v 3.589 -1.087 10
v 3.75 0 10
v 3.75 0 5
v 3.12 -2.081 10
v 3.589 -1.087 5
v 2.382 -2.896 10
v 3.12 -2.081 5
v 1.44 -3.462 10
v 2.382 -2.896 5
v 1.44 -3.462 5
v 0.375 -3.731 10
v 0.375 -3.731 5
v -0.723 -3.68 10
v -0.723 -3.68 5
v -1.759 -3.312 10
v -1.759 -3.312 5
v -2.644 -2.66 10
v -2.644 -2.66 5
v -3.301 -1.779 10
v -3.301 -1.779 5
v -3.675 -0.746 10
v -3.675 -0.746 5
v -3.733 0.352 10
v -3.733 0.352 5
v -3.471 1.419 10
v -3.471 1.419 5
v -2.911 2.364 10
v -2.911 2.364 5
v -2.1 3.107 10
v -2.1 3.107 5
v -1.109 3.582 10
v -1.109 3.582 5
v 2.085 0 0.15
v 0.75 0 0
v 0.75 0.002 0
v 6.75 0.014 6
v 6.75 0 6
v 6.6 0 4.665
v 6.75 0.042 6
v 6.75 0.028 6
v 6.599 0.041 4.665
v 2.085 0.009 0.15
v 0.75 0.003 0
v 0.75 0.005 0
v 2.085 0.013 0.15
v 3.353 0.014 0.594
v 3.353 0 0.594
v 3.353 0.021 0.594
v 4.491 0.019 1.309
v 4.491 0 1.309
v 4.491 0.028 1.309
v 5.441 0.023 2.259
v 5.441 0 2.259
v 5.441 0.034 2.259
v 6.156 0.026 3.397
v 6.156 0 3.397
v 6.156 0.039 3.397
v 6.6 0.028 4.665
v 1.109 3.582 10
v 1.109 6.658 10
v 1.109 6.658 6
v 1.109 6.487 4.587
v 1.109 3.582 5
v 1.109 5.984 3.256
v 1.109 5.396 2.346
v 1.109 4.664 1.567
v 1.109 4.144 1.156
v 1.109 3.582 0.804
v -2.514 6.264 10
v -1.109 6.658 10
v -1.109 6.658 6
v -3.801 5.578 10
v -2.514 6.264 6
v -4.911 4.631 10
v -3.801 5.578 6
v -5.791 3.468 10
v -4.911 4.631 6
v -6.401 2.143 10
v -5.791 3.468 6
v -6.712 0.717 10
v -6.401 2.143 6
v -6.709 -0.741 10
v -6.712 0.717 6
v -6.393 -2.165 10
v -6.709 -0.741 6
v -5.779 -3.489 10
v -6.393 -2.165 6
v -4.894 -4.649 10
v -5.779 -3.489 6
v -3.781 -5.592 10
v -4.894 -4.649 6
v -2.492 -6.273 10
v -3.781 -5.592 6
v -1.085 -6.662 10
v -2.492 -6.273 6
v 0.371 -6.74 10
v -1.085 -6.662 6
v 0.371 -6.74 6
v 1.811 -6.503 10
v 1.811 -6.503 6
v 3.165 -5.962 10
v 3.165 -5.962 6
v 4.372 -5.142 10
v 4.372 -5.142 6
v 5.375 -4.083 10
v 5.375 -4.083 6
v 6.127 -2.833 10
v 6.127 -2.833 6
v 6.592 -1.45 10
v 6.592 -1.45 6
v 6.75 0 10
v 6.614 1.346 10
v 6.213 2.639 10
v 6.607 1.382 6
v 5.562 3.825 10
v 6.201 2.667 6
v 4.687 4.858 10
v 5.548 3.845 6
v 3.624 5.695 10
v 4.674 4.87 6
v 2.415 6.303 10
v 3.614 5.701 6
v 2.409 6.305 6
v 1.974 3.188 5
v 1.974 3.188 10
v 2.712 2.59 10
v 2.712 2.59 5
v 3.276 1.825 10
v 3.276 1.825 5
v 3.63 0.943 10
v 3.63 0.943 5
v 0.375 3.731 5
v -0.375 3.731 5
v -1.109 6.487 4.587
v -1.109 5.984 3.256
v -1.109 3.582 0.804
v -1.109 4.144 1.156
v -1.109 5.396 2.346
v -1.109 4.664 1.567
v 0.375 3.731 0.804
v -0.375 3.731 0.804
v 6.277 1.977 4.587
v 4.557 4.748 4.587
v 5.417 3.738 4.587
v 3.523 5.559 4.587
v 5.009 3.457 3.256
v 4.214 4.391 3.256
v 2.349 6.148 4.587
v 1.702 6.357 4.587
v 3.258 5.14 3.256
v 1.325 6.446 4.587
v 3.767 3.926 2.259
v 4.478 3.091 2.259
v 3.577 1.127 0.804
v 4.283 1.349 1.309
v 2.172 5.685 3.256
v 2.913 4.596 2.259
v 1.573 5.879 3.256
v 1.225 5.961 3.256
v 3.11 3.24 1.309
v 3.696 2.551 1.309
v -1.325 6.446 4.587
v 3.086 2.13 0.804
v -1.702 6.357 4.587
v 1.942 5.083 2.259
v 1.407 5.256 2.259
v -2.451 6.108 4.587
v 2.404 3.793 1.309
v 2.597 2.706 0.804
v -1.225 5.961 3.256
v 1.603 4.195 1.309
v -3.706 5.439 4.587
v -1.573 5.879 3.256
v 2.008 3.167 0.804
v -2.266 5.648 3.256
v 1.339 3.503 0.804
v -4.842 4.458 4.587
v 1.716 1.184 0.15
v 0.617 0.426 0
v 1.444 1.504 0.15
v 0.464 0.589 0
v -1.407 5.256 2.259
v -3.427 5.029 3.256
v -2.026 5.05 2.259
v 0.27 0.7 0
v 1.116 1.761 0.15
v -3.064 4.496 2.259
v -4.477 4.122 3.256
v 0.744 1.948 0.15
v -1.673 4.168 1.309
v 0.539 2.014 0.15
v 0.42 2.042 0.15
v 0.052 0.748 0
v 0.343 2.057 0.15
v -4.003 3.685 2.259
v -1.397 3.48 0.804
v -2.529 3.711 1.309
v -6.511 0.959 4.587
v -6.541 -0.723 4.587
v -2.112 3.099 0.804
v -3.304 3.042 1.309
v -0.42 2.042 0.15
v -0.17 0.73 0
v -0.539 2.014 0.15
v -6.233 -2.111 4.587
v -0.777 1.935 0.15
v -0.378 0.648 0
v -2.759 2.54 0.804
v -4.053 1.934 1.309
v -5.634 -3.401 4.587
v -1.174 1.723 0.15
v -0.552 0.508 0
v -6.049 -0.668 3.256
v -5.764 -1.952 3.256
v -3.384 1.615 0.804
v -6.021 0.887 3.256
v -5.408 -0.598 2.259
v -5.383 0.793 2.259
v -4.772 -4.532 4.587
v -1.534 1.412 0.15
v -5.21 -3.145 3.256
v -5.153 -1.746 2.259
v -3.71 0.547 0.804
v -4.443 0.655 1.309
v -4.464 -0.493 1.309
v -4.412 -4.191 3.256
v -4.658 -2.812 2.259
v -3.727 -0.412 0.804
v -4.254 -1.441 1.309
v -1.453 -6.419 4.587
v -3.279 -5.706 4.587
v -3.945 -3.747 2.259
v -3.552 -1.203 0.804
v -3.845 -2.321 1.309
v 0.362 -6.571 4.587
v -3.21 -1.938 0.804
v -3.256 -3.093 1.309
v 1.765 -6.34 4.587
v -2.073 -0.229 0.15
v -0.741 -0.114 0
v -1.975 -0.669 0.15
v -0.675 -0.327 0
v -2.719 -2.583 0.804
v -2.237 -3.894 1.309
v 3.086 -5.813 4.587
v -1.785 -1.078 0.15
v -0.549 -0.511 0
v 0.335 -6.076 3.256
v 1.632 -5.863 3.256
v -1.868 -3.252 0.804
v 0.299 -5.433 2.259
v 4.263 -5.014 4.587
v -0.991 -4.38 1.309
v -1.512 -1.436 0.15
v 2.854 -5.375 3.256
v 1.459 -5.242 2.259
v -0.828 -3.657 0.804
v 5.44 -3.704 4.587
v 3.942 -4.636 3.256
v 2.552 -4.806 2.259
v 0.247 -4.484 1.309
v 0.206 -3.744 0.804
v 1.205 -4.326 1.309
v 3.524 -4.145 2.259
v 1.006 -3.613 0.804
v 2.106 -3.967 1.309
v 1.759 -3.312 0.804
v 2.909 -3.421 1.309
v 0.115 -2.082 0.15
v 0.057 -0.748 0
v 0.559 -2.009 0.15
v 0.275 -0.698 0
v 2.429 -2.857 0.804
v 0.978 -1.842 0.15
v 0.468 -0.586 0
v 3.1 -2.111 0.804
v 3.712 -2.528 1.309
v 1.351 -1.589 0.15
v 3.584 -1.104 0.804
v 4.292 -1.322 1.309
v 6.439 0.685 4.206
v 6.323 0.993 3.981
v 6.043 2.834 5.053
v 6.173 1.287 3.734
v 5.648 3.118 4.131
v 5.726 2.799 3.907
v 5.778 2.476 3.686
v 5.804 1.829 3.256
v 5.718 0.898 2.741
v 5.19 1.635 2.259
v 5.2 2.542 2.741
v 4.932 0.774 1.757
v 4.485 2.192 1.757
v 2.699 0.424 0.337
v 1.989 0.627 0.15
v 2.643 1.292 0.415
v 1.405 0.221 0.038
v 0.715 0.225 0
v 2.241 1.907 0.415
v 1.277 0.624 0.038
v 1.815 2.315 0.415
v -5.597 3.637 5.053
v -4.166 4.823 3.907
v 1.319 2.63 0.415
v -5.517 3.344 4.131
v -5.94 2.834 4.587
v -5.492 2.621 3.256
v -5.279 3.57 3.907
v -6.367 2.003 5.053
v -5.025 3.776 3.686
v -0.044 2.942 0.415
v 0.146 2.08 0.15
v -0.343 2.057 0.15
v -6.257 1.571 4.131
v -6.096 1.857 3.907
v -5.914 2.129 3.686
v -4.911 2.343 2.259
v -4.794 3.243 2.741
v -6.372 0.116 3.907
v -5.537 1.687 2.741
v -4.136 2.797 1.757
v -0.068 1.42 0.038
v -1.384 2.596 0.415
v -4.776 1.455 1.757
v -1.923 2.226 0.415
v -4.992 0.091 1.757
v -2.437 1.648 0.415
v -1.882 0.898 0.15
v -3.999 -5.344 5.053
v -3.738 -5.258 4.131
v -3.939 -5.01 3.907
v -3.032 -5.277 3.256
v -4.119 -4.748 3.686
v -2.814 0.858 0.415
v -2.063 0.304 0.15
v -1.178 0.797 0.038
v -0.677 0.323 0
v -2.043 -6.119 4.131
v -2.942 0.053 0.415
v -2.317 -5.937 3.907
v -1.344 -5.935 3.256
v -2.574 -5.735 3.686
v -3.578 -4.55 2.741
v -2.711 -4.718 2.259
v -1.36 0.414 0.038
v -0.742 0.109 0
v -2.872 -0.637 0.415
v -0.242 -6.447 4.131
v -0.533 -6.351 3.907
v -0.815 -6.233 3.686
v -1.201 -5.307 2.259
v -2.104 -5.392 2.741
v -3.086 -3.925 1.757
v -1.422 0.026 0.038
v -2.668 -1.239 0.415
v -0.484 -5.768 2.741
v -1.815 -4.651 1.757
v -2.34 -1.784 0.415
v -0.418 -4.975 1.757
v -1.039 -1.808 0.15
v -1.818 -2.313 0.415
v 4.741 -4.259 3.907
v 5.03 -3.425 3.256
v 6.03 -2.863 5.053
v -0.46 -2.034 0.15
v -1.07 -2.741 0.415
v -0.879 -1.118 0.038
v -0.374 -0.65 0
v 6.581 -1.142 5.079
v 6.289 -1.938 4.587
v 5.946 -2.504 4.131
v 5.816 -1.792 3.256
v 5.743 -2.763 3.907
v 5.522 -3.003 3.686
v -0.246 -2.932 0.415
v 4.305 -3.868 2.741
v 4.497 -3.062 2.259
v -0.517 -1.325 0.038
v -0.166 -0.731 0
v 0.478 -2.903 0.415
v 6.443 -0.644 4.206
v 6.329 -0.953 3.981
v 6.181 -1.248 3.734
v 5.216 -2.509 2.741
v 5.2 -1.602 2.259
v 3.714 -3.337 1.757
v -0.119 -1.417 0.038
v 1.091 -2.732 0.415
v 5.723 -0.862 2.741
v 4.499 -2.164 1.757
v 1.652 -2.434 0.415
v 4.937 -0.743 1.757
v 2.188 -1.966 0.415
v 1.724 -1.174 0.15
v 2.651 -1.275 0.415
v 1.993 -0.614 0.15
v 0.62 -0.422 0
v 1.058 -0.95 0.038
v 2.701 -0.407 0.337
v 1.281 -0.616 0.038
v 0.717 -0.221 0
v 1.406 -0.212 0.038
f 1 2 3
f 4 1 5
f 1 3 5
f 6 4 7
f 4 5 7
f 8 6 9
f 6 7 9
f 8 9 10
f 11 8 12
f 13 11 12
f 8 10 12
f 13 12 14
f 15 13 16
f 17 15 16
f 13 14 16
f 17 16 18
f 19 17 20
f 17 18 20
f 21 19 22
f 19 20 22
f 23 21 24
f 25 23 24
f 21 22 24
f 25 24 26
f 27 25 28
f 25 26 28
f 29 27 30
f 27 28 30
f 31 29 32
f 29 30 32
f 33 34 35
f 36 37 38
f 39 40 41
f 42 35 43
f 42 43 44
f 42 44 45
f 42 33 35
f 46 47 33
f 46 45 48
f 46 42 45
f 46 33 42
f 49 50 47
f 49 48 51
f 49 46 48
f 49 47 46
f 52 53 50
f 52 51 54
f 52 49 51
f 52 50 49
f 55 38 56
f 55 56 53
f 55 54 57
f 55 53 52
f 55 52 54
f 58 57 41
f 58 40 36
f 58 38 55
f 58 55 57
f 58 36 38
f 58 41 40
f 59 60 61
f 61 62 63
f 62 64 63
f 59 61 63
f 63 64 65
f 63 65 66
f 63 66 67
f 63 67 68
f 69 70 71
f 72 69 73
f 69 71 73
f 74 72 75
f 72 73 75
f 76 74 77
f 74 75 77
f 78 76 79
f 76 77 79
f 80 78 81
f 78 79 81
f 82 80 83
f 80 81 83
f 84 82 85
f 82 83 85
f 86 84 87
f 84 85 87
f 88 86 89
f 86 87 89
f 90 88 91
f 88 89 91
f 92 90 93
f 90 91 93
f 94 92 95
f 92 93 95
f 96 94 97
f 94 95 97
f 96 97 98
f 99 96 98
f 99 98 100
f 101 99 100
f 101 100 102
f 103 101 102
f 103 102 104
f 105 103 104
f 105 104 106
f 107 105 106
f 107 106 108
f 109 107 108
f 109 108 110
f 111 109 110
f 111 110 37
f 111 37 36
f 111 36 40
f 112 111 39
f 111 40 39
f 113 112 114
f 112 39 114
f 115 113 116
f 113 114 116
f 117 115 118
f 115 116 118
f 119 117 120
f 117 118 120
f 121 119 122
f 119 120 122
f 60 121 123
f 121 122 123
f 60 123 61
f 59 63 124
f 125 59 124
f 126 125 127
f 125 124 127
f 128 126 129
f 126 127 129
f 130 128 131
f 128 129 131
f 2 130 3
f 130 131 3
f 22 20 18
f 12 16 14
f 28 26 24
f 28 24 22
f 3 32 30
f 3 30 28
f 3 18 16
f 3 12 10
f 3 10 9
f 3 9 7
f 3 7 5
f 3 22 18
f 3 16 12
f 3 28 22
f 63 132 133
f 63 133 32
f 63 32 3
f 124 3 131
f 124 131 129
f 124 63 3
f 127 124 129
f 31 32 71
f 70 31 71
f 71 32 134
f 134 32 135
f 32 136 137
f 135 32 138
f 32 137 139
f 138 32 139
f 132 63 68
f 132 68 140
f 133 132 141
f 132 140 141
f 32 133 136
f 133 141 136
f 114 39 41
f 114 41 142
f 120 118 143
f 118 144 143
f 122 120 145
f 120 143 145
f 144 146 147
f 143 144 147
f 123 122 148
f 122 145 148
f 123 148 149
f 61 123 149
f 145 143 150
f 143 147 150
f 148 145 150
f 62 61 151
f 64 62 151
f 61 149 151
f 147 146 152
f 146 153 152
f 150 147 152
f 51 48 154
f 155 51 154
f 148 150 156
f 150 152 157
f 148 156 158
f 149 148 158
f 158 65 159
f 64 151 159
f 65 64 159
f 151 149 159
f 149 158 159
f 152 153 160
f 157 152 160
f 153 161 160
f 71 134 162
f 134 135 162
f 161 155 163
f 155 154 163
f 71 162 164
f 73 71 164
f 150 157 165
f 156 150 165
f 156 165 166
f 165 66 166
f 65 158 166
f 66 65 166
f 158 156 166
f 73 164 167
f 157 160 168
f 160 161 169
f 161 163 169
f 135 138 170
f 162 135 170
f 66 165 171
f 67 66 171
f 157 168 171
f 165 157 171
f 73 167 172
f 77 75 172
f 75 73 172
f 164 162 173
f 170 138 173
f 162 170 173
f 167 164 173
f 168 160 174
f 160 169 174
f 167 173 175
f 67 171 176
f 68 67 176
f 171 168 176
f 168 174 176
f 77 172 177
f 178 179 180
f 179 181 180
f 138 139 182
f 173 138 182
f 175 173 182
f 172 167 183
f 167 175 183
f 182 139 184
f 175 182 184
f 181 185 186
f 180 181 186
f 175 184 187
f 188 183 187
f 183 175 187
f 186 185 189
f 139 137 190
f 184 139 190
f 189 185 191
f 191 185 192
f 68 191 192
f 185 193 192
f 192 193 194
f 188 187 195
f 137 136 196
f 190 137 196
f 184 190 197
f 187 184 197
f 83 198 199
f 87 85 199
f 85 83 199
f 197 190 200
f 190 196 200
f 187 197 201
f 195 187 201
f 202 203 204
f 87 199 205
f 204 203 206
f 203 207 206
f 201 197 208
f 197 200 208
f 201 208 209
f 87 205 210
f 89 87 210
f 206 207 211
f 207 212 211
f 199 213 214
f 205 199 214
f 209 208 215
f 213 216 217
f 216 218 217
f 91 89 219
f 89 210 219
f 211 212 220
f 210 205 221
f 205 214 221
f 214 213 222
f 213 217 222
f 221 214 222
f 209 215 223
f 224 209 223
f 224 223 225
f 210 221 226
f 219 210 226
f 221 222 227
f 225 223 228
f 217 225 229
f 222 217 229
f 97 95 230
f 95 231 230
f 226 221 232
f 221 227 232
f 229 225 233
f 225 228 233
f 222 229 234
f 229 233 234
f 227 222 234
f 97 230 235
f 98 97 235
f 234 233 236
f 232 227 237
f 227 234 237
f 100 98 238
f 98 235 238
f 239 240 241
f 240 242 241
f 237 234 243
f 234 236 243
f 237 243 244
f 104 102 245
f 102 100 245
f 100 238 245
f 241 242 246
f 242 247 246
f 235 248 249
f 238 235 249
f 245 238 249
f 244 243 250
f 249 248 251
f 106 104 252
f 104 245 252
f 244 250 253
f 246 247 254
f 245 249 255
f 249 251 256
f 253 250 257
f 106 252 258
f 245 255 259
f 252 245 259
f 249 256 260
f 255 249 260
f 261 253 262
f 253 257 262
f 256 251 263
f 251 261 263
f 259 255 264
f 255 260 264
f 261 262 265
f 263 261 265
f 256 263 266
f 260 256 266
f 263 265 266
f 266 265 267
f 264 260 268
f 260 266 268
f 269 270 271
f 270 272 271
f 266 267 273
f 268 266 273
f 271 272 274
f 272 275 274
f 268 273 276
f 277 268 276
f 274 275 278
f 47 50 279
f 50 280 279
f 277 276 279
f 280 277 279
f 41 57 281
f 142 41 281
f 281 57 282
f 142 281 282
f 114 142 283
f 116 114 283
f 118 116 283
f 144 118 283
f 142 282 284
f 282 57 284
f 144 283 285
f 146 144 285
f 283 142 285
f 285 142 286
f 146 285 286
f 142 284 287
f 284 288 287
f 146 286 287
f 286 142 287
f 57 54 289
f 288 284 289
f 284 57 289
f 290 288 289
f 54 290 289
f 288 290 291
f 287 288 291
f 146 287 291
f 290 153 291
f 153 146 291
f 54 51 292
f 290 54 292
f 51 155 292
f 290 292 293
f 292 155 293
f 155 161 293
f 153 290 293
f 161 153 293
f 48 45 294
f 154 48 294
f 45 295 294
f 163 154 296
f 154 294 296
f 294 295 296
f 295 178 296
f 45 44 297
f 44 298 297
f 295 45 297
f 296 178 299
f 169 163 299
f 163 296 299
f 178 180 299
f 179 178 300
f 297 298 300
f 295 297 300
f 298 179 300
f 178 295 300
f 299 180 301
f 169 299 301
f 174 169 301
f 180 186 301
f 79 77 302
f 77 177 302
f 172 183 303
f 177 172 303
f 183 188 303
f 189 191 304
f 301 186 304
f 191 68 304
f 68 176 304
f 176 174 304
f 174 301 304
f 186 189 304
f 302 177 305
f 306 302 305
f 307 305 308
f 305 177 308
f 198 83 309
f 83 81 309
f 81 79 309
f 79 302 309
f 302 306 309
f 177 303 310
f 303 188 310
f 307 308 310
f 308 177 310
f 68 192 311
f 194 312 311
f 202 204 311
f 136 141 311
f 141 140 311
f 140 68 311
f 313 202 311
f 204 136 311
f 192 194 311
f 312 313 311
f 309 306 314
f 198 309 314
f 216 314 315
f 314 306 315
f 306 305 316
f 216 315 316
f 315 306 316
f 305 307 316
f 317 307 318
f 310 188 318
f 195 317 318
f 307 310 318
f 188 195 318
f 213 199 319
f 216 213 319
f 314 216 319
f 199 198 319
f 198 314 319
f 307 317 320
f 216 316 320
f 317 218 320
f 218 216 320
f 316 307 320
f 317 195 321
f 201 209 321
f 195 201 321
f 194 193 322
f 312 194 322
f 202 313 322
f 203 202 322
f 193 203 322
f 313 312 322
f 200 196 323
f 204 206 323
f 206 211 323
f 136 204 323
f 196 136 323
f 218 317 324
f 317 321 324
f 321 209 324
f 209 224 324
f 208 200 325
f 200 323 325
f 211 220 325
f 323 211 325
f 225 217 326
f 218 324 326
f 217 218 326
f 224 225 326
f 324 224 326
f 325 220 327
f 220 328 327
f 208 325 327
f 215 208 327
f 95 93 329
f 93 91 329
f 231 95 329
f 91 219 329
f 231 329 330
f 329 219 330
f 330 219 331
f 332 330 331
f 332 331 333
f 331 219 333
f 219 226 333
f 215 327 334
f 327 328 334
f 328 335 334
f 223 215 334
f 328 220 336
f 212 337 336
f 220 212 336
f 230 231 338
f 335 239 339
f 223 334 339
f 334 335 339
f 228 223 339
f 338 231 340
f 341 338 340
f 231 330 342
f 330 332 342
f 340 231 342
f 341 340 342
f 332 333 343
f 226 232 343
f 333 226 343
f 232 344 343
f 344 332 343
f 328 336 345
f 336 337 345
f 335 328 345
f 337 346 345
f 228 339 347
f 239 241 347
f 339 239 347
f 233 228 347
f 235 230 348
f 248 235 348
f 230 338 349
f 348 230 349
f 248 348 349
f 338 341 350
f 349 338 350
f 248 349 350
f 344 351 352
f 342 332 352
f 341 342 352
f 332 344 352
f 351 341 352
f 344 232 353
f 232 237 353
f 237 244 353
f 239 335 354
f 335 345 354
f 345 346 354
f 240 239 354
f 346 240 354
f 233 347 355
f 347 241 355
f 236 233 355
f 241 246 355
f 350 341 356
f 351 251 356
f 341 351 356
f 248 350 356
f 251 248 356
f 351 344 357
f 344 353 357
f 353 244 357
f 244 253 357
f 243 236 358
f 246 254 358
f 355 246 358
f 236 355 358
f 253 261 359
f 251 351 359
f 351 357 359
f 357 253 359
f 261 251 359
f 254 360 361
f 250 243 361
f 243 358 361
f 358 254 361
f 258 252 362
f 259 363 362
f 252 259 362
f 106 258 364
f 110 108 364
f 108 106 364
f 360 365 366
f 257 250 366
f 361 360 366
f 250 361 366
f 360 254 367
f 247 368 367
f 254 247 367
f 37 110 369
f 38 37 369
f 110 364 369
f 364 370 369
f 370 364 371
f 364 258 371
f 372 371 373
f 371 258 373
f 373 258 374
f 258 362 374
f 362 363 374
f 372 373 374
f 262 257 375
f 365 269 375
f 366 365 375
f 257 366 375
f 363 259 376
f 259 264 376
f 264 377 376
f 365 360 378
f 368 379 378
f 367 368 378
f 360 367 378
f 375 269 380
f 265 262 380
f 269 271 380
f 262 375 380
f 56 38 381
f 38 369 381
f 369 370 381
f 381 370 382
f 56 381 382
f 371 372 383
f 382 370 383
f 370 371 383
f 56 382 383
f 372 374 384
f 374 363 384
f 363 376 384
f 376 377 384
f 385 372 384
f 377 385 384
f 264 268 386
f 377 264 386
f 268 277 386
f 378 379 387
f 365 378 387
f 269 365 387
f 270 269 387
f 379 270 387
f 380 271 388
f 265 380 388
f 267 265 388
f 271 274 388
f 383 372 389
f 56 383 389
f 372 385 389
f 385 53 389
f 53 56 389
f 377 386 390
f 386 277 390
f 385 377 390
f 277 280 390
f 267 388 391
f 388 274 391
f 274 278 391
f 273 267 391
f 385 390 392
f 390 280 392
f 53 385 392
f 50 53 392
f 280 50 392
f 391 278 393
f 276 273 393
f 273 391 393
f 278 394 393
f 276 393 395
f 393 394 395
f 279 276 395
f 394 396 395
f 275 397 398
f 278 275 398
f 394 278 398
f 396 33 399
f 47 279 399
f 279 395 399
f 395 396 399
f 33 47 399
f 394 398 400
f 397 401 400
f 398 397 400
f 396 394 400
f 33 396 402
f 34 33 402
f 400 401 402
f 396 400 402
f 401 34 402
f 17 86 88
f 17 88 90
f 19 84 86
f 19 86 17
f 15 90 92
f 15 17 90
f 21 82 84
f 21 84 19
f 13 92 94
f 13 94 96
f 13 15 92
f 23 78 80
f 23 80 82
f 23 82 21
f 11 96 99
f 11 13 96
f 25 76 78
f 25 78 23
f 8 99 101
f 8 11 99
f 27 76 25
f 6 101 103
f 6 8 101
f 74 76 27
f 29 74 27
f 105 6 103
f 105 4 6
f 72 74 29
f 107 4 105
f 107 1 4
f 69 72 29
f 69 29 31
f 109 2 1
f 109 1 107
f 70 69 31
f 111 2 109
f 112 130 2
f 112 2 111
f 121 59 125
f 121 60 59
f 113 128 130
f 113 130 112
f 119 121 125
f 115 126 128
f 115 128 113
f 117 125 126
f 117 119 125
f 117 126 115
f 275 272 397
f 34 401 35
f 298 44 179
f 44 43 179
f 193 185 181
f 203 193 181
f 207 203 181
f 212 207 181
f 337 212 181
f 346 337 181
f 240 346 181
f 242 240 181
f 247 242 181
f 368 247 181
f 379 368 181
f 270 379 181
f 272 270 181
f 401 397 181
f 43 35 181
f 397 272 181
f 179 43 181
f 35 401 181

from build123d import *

# Parameters (mm, degrees)
F1_DEPTH    = 10
F2_DEPTH    = 5
F3_T2_ANGLE = 359.64
F3_T4_ANGLE = 207.9069363925


# Not quite as in the source:
# - a fillet or chamfer that OpenCascade refuses, or shapes differently, is made with other operations: its cross-section is extruded or revolved along the edge and cut away or added


with BuildPart() as f1:
    # F0 (on Top) → F1 (new body)
    with BuildSketch(Plane.XY):
        with BuildLine():
            ThreePointArc((1.1091883061, 3.5822062059), (3.0184396754, 2.2252015473), (3.75, 0))
            ThreePointArc((3.75, 0), (-2.2252015473, -3.0184396754), (-1.1091883061, 3.5822062059))
            Line((-1.1091883061, 3.5822062059), (-1.1091883061, 6.6582431092))
            ThreePointArc((-1.1091883061, 6.6582431092), (-4.3632258097, -5.1502194646), (6.75, 0))
            ThreePointArc((6.75, 0), (5.1502194646, 4.3632258097), (1.1091883061, 6.6582431092))
            Line((1.1091883061, 6.6582431092), (1.1091883061, 3.5822062059))
        make_face()
    extrude(amount=F1_DEPTH)

    # F0 (on Top) → F2 (join)
    with BuildSketch(Plane.XY):
        with BuildLine():
            ThreePointArc((-1.1091883061, 3.5822062059), (-2.2252015473, -3.0184396754), (3.75, 0))
            ThreePointArc((3.75, 0), (3.0184396754, 2.2252015473), (1.1091883061, 3.5822062059))
            Line((1.1091883061, 3.5822062059), (1.1091883061, 0.75))
            Line((1.1091883061, 0.75), (-1.1091883061, 0.75))
            Line((-1.1091883061, 0.75), (-1.1091883061, 3.5822062059))
        make_face()
        with BuildLine():
            Line((1.1091883061, 0.75), (1.1091883061, 3.5822062059))
            ThreePointArc((1.1091883061, 3.5822062059), (0, 3.75), (-1.1091883061, 3.5822062059))
            Line((-1.1091883061, 3.5822062059), (-1.1091883061, 0.75))
            Line((-1.1091883061, 0.75), (1.1091883061, 0.75))
        make_face()
    extrude(amount=F2_DEPTH)

    # F3: fillet of radius 6 on 1 edges, made by hand

    # F3_s1 → F3_t2 (revolve, cut)
    with BuildSketch(Plane(origin=(0, 0, 0), x_dir=(0, 0, 1), z_dir=(0.006283144, -0.9999802609, 0))):
        with BuildLine():
            ThreePointArc((6, -6.75), (1.7573593129, -4.9926406871), (0, -0.75))
            Line((0, -0.75), (0, -6.75))
            Line((0, -6.75), (6, -6.75))
        make_face()
    revolve(axis=Axis((0, 0, 0), (0, 0, 1)), revolution_arc=F3_T2_ANGLE, mode=Mode.SUBTRACT)

    # F3_s3 → F3_t4 (revolve, cut)
    with BuildSketch(Plane.XZ):
        with BuildLine():
            ThreePointArc((0.75, 0), (4.9926406871, 1.7573593129), (6.75, 6))
            Line((6.75, 6), (6.75, 0))
            Line((6.75, 0), (0.75, 0))
        make_face()
    revolve(axis=Axis((0, 0, 0), (0, 0, 1)), revolution_arc=F3_T4_ANGLE, mode=Mode.SUBTRACT)


solid = f1.part
